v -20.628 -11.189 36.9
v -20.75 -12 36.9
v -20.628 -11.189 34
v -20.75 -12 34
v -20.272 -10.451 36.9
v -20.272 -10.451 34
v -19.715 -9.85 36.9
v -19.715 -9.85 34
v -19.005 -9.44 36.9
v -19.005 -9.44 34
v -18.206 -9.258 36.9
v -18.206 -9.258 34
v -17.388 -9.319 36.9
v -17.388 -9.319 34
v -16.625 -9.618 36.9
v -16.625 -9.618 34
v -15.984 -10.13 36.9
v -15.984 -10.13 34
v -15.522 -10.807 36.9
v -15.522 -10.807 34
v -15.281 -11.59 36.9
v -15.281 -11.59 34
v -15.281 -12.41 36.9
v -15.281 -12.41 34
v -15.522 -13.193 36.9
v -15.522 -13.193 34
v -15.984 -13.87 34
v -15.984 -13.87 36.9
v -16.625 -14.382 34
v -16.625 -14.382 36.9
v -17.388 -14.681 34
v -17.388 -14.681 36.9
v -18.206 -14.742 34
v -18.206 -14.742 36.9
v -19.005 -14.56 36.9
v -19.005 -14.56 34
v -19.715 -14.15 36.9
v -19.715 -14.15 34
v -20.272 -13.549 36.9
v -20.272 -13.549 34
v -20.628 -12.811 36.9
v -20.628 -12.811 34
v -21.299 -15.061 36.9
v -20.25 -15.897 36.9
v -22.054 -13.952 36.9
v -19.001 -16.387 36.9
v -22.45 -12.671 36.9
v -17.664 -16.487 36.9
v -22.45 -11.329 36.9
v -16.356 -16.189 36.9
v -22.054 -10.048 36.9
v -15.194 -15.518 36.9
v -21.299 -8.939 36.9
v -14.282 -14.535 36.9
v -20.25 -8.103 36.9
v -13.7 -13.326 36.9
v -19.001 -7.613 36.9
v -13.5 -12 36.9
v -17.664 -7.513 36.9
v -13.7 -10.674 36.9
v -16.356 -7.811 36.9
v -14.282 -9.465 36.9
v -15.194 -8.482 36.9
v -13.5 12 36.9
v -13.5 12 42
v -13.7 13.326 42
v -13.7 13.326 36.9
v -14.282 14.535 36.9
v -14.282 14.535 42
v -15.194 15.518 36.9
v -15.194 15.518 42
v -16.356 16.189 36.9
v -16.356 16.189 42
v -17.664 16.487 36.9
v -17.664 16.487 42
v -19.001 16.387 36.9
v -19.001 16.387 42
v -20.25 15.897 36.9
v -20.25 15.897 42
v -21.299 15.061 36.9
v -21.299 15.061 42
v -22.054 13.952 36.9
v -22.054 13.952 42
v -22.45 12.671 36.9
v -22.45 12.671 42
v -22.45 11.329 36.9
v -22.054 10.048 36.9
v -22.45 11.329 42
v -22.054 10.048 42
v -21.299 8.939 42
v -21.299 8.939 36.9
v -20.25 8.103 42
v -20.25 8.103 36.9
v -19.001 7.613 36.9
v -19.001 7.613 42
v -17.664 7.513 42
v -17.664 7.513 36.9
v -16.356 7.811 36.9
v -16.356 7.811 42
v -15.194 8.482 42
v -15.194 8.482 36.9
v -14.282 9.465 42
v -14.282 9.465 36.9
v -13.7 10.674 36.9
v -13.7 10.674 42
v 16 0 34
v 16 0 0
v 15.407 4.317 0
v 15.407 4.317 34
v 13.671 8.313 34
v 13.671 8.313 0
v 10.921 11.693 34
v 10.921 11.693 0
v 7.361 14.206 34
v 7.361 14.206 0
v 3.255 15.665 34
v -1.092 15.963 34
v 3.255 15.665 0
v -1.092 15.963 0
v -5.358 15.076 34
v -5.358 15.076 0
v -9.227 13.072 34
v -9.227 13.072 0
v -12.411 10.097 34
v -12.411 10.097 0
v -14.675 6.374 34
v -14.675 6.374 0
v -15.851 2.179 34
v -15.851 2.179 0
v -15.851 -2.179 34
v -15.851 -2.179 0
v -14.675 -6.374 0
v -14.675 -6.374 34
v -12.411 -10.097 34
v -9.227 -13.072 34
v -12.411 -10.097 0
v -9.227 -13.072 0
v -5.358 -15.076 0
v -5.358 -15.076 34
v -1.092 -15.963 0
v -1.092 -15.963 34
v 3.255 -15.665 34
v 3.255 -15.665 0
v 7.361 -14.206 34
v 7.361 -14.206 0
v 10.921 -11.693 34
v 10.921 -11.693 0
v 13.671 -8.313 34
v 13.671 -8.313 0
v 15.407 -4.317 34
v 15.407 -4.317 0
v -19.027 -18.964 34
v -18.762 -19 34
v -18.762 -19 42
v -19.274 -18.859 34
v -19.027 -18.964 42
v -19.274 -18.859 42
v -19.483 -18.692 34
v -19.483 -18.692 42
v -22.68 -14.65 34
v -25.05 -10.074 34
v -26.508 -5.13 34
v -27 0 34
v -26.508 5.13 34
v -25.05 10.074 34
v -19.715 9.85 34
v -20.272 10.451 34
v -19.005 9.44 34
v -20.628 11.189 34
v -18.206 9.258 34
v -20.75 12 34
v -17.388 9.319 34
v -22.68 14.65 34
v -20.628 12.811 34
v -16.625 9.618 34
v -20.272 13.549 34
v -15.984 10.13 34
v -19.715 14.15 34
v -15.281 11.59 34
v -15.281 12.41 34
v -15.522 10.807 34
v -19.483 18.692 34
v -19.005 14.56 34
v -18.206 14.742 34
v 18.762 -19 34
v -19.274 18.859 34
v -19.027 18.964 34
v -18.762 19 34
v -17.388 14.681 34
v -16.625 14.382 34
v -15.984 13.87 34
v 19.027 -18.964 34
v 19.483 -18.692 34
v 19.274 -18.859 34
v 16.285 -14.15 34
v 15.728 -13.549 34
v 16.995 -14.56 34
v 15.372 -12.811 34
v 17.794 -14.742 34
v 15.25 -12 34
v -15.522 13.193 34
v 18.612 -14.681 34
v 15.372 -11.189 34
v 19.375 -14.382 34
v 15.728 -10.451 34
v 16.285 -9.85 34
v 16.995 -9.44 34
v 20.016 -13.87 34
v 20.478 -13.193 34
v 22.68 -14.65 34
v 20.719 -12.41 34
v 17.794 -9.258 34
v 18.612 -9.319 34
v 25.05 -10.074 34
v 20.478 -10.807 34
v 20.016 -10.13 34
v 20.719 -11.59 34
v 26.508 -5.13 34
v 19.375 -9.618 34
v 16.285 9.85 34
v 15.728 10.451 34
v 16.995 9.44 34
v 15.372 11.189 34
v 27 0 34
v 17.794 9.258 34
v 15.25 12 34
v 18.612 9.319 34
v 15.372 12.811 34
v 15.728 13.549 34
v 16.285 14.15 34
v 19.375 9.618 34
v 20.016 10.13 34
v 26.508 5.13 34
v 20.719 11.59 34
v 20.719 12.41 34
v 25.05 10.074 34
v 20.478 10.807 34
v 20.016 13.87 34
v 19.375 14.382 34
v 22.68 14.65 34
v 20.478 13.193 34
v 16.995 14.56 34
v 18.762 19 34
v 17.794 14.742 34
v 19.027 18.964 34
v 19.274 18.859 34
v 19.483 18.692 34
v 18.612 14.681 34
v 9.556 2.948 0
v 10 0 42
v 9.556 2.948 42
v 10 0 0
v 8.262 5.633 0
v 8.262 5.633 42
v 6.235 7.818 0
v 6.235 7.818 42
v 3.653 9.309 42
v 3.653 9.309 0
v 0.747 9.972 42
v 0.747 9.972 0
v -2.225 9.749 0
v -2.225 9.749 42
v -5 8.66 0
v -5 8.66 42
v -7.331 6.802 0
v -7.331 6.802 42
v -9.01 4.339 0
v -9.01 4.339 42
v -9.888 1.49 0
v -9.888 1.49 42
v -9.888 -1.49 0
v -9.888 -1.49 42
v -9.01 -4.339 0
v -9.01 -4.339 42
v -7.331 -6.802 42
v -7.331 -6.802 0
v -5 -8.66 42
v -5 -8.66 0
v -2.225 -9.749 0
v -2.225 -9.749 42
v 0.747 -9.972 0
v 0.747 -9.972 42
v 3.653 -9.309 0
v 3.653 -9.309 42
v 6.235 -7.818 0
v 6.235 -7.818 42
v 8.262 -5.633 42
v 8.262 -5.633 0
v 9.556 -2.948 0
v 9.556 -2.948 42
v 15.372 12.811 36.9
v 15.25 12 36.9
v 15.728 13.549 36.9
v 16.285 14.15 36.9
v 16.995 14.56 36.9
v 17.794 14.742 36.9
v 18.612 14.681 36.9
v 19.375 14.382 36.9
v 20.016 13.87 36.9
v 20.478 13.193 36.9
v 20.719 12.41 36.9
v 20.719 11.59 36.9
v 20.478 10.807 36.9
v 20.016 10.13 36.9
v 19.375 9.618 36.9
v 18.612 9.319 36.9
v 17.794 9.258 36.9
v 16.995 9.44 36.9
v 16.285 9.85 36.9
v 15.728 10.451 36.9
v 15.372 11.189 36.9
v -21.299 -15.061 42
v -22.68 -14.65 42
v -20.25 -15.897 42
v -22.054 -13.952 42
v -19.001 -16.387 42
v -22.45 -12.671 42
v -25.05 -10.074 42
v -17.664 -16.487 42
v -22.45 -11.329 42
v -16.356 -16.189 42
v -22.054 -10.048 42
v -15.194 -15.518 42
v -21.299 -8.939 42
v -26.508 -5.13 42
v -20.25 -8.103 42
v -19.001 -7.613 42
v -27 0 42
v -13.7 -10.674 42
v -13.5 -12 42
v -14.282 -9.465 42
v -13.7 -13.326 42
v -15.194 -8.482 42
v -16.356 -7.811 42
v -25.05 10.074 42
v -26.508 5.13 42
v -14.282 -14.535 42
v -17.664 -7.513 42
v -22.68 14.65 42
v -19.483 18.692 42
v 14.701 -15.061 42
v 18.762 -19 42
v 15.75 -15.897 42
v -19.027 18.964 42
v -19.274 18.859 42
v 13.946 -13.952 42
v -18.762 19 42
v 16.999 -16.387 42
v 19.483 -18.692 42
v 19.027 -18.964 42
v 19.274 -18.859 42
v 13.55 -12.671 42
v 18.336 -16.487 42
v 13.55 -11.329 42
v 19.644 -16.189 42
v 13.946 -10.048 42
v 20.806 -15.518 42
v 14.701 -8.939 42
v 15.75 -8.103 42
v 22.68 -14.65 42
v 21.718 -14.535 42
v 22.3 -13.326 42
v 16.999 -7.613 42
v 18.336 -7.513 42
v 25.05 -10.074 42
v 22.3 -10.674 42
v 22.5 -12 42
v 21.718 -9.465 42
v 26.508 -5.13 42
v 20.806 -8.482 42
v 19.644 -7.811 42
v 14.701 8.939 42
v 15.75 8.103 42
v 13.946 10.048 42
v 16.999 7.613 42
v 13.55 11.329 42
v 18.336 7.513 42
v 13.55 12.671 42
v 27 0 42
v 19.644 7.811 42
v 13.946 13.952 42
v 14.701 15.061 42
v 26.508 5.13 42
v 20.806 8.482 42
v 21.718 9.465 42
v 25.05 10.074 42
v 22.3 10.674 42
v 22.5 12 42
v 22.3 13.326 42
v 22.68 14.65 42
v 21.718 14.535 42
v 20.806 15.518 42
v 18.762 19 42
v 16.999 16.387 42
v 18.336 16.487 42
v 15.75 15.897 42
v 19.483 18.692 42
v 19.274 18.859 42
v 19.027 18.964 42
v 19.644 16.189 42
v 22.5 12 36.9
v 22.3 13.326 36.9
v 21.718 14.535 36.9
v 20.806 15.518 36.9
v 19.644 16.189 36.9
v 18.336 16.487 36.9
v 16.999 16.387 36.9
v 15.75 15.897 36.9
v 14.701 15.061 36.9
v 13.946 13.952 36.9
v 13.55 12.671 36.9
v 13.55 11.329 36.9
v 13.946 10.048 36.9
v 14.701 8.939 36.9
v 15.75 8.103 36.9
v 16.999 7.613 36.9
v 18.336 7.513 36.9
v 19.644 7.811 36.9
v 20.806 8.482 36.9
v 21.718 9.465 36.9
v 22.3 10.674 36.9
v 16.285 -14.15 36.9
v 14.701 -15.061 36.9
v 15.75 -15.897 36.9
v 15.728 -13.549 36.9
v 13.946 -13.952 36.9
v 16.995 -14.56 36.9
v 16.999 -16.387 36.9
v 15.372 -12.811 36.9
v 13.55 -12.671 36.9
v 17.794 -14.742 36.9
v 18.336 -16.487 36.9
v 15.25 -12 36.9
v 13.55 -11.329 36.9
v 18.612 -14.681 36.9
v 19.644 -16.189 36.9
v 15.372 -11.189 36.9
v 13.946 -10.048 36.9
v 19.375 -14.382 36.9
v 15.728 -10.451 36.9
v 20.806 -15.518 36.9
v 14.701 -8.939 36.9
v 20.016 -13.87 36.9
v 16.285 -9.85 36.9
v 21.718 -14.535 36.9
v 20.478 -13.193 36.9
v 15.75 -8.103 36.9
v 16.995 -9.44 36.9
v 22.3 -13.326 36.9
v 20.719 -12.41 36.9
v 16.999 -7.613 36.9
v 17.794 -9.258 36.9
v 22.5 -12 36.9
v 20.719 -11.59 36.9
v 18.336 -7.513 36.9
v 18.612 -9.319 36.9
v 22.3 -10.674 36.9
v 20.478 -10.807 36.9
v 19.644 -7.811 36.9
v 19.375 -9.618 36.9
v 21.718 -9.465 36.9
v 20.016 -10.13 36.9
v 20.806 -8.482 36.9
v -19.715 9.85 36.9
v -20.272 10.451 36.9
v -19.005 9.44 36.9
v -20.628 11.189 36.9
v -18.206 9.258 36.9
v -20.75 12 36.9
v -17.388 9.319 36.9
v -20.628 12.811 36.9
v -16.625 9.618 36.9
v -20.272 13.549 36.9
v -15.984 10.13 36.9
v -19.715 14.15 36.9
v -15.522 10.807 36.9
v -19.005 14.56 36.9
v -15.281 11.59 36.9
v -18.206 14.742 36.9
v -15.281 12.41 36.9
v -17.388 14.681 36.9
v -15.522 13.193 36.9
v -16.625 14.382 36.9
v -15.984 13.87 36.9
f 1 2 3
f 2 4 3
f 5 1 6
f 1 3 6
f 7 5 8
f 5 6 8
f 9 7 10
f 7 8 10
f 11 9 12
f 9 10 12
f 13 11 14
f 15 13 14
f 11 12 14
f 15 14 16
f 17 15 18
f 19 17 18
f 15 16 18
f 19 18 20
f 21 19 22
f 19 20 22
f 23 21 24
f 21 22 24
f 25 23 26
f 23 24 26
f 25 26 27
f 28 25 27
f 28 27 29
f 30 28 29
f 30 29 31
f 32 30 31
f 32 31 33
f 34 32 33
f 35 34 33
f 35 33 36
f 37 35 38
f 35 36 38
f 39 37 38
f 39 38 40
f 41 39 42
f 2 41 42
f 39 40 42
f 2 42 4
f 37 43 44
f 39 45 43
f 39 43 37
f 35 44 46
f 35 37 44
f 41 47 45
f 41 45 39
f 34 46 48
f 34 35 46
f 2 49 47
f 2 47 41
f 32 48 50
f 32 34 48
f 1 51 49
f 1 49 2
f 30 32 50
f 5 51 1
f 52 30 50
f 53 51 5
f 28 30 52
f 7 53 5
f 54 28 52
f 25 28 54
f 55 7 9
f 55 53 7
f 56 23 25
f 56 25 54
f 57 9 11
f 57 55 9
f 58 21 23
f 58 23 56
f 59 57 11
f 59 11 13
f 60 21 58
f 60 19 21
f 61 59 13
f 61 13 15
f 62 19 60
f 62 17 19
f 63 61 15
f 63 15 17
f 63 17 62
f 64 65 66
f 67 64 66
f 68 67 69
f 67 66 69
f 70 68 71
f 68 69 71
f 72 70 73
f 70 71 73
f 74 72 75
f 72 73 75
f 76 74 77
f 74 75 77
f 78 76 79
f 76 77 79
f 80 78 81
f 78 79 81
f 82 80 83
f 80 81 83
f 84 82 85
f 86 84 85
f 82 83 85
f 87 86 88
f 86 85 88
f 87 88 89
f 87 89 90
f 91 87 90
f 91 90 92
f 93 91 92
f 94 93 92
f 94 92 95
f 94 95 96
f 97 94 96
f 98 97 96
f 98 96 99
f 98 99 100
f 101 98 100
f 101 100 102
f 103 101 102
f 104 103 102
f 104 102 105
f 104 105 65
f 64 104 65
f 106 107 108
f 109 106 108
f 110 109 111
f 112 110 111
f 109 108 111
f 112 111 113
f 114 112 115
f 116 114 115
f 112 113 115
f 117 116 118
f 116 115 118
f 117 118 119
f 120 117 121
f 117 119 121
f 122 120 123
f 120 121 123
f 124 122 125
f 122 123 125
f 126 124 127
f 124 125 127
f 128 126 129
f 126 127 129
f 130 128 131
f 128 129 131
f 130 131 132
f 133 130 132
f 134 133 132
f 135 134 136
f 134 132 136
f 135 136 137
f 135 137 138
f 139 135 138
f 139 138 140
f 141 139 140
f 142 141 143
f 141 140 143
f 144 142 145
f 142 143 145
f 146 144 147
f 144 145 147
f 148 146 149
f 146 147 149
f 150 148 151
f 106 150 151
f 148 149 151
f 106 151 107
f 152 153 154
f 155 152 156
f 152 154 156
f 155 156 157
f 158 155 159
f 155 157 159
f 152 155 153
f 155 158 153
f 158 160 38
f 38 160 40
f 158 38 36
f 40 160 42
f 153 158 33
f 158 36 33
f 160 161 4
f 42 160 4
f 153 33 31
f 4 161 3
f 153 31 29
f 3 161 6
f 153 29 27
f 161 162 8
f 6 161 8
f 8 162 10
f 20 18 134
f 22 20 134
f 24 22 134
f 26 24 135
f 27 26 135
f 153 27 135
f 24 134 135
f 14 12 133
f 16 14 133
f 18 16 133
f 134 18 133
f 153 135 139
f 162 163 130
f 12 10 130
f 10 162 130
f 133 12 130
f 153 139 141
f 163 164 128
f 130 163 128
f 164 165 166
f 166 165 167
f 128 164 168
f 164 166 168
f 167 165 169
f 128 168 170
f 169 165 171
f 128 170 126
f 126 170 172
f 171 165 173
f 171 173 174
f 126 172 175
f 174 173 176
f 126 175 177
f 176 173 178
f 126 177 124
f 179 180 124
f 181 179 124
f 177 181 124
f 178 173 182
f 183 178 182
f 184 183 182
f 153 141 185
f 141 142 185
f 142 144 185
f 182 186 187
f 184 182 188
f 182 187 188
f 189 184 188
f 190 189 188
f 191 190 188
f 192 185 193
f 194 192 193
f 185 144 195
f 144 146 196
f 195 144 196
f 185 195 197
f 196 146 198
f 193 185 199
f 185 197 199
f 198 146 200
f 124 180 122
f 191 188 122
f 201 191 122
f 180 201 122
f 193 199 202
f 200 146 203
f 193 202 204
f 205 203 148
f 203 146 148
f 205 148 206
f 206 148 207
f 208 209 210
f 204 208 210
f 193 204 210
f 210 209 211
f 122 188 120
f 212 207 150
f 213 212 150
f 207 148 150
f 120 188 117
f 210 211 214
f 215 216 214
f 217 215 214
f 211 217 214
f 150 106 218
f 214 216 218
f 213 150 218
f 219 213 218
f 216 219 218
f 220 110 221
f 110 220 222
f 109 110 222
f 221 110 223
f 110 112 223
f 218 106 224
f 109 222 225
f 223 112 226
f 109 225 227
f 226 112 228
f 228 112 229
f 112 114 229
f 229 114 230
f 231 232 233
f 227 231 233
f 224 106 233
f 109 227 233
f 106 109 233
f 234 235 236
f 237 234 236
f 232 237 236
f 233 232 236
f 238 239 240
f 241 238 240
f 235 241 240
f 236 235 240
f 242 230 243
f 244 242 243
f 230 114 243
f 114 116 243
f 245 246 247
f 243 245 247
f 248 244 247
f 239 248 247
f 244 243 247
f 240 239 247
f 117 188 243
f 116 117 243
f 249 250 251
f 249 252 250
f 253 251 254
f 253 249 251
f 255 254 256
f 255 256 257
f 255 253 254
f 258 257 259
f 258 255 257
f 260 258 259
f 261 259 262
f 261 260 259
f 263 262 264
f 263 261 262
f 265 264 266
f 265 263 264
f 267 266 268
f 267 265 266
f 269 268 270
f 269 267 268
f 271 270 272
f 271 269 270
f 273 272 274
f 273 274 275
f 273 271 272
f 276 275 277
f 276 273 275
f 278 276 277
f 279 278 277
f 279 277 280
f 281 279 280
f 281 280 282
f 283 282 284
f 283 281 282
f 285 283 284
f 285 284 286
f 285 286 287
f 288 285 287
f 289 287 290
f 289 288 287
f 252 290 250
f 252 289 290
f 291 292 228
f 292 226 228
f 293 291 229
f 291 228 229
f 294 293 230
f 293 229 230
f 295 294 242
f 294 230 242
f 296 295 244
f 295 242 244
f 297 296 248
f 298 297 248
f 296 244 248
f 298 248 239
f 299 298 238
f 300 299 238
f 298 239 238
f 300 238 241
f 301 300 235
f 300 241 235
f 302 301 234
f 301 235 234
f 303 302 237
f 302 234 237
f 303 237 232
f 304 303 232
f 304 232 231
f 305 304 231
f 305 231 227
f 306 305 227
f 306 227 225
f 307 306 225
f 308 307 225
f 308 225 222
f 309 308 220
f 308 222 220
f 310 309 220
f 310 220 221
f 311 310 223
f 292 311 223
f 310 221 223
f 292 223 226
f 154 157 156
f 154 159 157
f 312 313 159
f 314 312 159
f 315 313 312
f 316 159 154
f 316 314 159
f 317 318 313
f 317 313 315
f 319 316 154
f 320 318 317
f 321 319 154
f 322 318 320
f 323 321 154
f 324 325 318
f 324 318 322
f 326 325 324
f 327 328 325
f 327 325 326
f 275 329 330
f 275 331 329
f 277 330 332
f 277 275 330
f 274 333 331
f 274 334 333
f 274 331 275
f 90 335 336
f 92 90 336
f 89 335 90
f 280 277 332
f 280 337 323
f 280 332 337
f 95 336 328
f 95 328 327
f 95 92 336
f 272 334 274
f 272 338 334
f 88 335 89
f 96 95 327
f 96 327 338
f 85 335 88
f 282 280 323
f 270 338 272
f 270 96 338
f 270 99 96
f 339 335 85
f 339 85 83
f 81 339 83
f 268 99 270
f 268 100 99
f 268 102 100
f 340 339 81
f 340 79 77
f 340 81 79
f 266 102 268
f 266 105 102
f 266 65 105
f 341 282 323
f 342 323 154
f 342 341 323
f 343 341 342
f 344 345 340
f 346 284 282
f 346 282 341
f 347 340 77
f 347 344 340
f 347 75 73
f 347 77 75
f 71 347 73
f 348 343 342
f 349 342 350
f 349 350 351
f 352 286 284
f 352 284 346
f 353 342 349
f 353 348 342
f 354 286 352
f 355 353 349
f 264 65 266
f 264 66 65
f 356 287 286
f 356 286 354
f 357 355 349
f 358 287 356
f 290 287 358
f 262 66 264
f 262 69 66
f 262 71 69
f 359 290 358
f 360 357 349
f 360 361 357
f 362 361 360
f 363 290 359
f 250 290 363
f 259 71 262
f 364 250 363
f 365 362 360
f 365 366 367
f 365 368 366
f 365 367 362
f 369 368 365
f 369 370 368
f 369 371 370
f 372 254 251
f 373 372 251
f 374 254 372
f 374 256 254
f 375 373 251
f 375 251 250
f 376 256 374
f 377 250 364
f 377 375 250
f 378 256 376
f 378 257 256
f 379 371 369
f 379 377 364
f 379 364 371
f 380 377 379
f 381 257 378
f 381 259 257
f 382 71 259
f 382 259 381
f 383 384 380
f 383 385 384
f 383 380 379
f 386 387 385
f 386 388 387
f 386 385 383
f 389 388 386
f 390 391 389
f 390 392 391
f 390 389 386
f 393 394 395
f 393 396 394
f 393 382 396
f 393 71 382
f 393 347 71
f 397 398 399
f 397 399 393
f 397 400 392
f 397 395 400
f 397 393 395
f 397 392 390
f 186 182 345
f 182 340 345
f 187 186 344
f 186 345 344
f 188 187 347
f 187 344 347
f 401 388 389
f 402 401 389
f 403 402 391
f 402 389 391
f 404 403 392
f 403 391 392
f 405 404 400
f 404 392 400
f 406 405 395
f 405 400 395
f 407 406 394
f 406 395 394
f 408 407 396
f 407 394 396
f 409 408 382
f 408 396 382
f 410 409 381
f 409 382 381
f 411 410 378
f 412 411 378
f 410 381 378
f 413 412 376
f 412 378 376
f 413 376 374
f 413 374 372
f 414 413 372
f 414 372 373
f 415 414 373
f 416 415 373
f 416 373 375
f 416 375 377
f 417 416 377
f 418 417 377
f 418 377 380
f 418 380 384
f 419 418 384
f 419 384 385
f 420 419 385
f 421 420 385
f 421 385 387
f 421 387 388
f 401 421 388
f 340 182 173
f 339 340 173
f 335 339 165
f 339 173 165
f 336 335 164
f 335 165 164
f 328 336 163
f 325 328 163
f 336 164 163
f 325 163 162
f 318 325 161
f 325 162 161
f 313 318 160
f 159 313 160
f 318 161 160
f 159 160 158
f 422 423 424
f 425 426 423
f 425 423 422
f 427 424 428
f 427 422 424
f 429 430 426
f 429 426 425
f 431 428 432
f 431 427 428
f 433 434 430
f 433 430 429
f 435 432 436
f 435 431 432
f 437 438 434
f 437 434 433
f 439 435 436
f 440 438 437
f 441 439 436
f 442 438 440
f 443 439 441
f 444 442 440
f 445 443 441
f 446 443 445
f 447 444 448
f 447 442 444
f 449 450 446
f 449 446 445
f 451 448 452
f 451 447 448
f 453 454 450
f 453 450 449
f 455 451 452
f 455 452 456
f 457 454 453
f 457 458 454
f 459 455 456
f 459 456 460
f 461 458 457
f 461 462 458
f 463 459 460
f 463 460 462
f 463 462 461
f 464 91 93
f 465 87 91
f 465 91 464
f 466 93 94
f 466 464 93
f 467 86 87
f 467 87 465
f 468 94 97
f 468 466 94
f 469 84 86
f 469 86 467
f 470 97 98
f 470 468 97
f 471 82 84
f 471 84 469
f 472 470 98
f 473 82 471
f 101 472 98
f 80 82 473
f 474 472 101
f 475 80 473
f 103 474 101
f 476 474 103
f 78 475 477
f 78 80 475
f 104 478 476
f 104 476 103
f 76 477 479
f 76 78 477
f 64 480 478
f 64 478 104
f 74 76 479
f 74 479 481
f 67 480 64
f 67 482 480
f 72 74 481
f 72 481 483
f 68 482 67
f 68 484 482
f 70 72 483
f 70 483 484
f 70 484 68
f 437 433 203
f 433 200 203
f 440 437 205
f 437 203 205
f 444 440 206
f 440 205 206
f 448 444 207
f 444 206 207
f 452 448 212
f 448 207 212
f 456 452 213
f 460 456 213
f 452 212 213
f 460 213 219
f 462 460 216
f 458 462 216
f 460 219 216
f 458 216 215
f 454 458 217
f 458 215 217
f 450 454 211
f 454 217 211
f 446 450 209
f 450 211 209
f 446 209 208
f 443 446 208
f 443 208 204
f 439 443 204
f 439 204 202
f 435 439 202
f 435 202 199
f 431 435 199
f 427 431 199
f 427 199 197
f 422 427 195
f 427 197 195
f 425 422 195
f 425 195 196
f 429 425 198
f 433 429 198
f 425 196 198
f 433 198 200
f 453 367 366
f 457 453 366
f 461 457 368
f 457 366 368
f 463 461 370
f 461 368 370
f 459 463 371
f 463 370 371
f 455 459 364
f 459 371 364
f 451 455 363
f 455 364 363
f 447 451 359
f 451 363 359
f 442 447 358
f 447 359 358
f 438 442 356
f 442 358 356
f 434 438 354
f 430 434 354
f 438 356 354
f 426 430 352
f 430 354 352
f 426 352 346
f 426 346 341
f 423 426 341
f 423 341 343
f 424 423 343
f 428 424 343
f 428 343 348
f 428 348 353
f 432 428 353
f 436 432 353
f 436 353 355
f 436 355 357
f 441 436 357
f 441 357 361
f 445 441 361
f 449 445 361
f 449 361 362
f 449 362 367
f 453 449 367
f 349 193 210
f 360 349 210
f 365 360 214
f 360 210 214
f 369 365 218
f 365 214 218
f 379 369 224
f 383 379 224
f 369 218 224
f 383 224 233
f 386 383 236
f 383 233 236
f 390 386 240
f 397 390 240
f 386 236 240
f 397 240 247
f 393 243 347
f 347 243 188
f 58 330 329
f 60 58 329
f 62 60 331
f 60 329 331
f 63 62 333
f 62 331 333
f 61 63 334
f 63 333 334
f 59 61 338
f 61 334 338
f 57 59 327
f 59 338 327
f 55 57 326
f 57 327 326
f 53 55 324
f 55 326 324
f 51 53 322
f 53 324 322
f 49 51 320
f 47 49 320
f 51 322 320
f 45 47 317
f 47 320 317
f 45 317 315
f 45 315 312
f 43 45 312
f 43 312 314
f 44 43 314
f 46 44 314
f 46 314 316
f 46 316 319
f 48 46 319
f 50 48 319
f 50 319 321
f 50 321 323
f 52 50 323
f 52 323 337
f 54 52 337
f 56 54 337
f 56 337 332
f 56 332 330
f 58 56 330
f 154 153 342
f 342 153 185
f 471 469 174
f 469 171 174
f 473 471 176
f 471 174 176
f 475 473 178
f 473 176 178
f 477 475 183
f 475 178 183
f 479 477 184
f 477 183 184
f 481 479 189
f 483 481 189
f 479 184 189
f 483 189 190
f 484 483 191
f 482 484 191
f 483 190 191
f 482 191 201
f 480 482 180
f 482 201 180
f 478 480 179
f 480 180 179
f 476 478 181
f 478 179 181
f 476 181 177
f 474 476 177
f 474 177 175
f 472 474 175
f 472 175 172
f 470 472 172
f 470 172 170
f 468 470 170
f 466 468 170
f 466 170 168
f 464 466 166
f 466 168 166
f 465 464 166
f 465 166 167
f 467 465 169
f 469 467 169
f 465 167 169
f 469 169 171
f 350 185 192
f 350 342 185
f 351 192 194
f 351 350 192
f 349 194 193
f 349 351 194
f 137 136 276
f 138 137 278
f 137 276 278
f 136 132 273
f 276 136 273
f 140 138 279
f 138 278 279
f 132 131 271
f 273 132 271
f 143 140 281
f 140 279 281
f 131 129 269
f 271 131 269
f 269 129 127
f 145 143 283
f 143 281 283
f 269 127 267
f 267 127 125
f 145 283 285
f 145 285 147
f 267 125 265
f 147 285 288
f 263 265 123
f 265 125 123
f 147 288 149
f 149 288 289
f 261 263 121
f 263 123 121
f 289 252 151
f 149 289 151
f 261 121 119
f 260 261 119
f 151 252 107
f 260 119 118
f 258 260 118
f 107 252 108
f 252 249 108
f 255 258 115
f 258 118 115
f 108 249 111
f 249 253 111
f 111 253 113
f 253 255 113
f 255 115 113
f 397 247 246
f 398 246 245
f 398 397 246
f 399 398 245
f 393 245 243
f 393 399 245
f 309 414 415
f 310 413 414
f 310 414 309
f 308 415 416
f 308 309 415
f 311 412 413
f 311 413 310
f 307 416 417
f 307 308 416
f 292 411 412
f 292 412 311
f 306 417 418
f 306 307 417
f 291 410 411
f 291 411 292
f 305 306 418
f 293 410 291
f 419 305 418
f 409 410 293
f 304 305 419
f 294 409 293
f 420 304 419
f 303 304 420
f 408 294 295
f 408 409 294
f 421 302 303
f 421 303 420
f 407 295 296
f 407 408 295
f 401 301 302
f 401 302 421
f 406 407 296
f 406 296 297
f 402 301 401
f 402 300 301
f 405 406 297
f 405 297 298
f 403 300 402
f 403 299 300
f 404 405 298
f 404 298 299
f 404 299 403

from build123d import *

# Parameters (mm, degrees)
SKETCH1_R                                           = 16
SKETCH1_R_2                                         = 10
BOSS_EXTRUDE1_DEPTH                                 = 34
SKETCH2_R                                           = 10
BOSS_EXTRUDE2_DEPTH                                 = 8
CBORE_FOR_M5_HEX_SOCKET_HEAD_CAP_SCREW1_D           = 5.5
CBORE_FOR_M5_HEX_SOCKET_HEAD_CAP_SCREW1_CBORE_D     = 9
CBORE_FOR_M5_HEX_SOCKET_HEAD_CAP_SCREW1_CBORE_DEPTH = 5.1
FILLET1_R                                           = 1


with BuildPart() as part:
    # Sketch1 → Boss-Extrude1 (new body)
    with BuildSketch(Plane.XY):
        Circle(SKETCH1_R)
        Circle(SKETCH1_R_2, mode=Mode.SUBTRACT)
    extrude(amount=BOSS_EXTRUDE1_DEPTH)

    # Sketch2 → Boss-Extrude2 (add)
    with BuildSketch(Plane.XY.offset(34)):
        with BuildLine():
            Line((-19.183326093, -19), (19.183326093, -19))
            ThreePointArc((19.183326093, -19), (27, 0), (19.183326093, 19))
            Line((19.183326093, 19), (-19.183326093, 19))
            ThreePointArc((-19.183326093, 19), (-27, 0), (-19.183326093, -19))
        make_face()
        Circle(SKETCH2_R, mode=Mode.SUBTRACT)
    extrude(amount=BOSS_EXTRUDE2_DEPTH)

    # CBORE for M5 Hex Socket Head Cap Screw1 (through all)
    with Locations(Plane(origin=(-18, -12, 42), x_dir=(1, 0, 0), z_dir=(0, 0, 1))):
        with Locations((0, 0), (0, 24), (36, 24), (36, 0)):
            CounterBoreHole(CBORE_FOR_M5_HEX_SOCKET_HEAD_CAP_SCREW1_D / 2, CBORE_FOR_M5_HEX_SOCKET_HEAD_CAP_SCREW1_CBORE_D / 2, CBORE_FOR_M5_HEX_SOCKET_HEAD_CAP_SCREW1_CBORE_DEPTH)

    # Fillet1
    fillet1_edges = [part.edges().sort_by_distance(p)[0] for p in [
        (-19.183326093, 19, 38),
        (-19.183326093, -19, 38),
        (19.183326093, -19, 38),
        (19.183326093, 19, 38),
    ]]
    fillet(fillet1_edges, radius=FILLET1_R)


solid = part.part
